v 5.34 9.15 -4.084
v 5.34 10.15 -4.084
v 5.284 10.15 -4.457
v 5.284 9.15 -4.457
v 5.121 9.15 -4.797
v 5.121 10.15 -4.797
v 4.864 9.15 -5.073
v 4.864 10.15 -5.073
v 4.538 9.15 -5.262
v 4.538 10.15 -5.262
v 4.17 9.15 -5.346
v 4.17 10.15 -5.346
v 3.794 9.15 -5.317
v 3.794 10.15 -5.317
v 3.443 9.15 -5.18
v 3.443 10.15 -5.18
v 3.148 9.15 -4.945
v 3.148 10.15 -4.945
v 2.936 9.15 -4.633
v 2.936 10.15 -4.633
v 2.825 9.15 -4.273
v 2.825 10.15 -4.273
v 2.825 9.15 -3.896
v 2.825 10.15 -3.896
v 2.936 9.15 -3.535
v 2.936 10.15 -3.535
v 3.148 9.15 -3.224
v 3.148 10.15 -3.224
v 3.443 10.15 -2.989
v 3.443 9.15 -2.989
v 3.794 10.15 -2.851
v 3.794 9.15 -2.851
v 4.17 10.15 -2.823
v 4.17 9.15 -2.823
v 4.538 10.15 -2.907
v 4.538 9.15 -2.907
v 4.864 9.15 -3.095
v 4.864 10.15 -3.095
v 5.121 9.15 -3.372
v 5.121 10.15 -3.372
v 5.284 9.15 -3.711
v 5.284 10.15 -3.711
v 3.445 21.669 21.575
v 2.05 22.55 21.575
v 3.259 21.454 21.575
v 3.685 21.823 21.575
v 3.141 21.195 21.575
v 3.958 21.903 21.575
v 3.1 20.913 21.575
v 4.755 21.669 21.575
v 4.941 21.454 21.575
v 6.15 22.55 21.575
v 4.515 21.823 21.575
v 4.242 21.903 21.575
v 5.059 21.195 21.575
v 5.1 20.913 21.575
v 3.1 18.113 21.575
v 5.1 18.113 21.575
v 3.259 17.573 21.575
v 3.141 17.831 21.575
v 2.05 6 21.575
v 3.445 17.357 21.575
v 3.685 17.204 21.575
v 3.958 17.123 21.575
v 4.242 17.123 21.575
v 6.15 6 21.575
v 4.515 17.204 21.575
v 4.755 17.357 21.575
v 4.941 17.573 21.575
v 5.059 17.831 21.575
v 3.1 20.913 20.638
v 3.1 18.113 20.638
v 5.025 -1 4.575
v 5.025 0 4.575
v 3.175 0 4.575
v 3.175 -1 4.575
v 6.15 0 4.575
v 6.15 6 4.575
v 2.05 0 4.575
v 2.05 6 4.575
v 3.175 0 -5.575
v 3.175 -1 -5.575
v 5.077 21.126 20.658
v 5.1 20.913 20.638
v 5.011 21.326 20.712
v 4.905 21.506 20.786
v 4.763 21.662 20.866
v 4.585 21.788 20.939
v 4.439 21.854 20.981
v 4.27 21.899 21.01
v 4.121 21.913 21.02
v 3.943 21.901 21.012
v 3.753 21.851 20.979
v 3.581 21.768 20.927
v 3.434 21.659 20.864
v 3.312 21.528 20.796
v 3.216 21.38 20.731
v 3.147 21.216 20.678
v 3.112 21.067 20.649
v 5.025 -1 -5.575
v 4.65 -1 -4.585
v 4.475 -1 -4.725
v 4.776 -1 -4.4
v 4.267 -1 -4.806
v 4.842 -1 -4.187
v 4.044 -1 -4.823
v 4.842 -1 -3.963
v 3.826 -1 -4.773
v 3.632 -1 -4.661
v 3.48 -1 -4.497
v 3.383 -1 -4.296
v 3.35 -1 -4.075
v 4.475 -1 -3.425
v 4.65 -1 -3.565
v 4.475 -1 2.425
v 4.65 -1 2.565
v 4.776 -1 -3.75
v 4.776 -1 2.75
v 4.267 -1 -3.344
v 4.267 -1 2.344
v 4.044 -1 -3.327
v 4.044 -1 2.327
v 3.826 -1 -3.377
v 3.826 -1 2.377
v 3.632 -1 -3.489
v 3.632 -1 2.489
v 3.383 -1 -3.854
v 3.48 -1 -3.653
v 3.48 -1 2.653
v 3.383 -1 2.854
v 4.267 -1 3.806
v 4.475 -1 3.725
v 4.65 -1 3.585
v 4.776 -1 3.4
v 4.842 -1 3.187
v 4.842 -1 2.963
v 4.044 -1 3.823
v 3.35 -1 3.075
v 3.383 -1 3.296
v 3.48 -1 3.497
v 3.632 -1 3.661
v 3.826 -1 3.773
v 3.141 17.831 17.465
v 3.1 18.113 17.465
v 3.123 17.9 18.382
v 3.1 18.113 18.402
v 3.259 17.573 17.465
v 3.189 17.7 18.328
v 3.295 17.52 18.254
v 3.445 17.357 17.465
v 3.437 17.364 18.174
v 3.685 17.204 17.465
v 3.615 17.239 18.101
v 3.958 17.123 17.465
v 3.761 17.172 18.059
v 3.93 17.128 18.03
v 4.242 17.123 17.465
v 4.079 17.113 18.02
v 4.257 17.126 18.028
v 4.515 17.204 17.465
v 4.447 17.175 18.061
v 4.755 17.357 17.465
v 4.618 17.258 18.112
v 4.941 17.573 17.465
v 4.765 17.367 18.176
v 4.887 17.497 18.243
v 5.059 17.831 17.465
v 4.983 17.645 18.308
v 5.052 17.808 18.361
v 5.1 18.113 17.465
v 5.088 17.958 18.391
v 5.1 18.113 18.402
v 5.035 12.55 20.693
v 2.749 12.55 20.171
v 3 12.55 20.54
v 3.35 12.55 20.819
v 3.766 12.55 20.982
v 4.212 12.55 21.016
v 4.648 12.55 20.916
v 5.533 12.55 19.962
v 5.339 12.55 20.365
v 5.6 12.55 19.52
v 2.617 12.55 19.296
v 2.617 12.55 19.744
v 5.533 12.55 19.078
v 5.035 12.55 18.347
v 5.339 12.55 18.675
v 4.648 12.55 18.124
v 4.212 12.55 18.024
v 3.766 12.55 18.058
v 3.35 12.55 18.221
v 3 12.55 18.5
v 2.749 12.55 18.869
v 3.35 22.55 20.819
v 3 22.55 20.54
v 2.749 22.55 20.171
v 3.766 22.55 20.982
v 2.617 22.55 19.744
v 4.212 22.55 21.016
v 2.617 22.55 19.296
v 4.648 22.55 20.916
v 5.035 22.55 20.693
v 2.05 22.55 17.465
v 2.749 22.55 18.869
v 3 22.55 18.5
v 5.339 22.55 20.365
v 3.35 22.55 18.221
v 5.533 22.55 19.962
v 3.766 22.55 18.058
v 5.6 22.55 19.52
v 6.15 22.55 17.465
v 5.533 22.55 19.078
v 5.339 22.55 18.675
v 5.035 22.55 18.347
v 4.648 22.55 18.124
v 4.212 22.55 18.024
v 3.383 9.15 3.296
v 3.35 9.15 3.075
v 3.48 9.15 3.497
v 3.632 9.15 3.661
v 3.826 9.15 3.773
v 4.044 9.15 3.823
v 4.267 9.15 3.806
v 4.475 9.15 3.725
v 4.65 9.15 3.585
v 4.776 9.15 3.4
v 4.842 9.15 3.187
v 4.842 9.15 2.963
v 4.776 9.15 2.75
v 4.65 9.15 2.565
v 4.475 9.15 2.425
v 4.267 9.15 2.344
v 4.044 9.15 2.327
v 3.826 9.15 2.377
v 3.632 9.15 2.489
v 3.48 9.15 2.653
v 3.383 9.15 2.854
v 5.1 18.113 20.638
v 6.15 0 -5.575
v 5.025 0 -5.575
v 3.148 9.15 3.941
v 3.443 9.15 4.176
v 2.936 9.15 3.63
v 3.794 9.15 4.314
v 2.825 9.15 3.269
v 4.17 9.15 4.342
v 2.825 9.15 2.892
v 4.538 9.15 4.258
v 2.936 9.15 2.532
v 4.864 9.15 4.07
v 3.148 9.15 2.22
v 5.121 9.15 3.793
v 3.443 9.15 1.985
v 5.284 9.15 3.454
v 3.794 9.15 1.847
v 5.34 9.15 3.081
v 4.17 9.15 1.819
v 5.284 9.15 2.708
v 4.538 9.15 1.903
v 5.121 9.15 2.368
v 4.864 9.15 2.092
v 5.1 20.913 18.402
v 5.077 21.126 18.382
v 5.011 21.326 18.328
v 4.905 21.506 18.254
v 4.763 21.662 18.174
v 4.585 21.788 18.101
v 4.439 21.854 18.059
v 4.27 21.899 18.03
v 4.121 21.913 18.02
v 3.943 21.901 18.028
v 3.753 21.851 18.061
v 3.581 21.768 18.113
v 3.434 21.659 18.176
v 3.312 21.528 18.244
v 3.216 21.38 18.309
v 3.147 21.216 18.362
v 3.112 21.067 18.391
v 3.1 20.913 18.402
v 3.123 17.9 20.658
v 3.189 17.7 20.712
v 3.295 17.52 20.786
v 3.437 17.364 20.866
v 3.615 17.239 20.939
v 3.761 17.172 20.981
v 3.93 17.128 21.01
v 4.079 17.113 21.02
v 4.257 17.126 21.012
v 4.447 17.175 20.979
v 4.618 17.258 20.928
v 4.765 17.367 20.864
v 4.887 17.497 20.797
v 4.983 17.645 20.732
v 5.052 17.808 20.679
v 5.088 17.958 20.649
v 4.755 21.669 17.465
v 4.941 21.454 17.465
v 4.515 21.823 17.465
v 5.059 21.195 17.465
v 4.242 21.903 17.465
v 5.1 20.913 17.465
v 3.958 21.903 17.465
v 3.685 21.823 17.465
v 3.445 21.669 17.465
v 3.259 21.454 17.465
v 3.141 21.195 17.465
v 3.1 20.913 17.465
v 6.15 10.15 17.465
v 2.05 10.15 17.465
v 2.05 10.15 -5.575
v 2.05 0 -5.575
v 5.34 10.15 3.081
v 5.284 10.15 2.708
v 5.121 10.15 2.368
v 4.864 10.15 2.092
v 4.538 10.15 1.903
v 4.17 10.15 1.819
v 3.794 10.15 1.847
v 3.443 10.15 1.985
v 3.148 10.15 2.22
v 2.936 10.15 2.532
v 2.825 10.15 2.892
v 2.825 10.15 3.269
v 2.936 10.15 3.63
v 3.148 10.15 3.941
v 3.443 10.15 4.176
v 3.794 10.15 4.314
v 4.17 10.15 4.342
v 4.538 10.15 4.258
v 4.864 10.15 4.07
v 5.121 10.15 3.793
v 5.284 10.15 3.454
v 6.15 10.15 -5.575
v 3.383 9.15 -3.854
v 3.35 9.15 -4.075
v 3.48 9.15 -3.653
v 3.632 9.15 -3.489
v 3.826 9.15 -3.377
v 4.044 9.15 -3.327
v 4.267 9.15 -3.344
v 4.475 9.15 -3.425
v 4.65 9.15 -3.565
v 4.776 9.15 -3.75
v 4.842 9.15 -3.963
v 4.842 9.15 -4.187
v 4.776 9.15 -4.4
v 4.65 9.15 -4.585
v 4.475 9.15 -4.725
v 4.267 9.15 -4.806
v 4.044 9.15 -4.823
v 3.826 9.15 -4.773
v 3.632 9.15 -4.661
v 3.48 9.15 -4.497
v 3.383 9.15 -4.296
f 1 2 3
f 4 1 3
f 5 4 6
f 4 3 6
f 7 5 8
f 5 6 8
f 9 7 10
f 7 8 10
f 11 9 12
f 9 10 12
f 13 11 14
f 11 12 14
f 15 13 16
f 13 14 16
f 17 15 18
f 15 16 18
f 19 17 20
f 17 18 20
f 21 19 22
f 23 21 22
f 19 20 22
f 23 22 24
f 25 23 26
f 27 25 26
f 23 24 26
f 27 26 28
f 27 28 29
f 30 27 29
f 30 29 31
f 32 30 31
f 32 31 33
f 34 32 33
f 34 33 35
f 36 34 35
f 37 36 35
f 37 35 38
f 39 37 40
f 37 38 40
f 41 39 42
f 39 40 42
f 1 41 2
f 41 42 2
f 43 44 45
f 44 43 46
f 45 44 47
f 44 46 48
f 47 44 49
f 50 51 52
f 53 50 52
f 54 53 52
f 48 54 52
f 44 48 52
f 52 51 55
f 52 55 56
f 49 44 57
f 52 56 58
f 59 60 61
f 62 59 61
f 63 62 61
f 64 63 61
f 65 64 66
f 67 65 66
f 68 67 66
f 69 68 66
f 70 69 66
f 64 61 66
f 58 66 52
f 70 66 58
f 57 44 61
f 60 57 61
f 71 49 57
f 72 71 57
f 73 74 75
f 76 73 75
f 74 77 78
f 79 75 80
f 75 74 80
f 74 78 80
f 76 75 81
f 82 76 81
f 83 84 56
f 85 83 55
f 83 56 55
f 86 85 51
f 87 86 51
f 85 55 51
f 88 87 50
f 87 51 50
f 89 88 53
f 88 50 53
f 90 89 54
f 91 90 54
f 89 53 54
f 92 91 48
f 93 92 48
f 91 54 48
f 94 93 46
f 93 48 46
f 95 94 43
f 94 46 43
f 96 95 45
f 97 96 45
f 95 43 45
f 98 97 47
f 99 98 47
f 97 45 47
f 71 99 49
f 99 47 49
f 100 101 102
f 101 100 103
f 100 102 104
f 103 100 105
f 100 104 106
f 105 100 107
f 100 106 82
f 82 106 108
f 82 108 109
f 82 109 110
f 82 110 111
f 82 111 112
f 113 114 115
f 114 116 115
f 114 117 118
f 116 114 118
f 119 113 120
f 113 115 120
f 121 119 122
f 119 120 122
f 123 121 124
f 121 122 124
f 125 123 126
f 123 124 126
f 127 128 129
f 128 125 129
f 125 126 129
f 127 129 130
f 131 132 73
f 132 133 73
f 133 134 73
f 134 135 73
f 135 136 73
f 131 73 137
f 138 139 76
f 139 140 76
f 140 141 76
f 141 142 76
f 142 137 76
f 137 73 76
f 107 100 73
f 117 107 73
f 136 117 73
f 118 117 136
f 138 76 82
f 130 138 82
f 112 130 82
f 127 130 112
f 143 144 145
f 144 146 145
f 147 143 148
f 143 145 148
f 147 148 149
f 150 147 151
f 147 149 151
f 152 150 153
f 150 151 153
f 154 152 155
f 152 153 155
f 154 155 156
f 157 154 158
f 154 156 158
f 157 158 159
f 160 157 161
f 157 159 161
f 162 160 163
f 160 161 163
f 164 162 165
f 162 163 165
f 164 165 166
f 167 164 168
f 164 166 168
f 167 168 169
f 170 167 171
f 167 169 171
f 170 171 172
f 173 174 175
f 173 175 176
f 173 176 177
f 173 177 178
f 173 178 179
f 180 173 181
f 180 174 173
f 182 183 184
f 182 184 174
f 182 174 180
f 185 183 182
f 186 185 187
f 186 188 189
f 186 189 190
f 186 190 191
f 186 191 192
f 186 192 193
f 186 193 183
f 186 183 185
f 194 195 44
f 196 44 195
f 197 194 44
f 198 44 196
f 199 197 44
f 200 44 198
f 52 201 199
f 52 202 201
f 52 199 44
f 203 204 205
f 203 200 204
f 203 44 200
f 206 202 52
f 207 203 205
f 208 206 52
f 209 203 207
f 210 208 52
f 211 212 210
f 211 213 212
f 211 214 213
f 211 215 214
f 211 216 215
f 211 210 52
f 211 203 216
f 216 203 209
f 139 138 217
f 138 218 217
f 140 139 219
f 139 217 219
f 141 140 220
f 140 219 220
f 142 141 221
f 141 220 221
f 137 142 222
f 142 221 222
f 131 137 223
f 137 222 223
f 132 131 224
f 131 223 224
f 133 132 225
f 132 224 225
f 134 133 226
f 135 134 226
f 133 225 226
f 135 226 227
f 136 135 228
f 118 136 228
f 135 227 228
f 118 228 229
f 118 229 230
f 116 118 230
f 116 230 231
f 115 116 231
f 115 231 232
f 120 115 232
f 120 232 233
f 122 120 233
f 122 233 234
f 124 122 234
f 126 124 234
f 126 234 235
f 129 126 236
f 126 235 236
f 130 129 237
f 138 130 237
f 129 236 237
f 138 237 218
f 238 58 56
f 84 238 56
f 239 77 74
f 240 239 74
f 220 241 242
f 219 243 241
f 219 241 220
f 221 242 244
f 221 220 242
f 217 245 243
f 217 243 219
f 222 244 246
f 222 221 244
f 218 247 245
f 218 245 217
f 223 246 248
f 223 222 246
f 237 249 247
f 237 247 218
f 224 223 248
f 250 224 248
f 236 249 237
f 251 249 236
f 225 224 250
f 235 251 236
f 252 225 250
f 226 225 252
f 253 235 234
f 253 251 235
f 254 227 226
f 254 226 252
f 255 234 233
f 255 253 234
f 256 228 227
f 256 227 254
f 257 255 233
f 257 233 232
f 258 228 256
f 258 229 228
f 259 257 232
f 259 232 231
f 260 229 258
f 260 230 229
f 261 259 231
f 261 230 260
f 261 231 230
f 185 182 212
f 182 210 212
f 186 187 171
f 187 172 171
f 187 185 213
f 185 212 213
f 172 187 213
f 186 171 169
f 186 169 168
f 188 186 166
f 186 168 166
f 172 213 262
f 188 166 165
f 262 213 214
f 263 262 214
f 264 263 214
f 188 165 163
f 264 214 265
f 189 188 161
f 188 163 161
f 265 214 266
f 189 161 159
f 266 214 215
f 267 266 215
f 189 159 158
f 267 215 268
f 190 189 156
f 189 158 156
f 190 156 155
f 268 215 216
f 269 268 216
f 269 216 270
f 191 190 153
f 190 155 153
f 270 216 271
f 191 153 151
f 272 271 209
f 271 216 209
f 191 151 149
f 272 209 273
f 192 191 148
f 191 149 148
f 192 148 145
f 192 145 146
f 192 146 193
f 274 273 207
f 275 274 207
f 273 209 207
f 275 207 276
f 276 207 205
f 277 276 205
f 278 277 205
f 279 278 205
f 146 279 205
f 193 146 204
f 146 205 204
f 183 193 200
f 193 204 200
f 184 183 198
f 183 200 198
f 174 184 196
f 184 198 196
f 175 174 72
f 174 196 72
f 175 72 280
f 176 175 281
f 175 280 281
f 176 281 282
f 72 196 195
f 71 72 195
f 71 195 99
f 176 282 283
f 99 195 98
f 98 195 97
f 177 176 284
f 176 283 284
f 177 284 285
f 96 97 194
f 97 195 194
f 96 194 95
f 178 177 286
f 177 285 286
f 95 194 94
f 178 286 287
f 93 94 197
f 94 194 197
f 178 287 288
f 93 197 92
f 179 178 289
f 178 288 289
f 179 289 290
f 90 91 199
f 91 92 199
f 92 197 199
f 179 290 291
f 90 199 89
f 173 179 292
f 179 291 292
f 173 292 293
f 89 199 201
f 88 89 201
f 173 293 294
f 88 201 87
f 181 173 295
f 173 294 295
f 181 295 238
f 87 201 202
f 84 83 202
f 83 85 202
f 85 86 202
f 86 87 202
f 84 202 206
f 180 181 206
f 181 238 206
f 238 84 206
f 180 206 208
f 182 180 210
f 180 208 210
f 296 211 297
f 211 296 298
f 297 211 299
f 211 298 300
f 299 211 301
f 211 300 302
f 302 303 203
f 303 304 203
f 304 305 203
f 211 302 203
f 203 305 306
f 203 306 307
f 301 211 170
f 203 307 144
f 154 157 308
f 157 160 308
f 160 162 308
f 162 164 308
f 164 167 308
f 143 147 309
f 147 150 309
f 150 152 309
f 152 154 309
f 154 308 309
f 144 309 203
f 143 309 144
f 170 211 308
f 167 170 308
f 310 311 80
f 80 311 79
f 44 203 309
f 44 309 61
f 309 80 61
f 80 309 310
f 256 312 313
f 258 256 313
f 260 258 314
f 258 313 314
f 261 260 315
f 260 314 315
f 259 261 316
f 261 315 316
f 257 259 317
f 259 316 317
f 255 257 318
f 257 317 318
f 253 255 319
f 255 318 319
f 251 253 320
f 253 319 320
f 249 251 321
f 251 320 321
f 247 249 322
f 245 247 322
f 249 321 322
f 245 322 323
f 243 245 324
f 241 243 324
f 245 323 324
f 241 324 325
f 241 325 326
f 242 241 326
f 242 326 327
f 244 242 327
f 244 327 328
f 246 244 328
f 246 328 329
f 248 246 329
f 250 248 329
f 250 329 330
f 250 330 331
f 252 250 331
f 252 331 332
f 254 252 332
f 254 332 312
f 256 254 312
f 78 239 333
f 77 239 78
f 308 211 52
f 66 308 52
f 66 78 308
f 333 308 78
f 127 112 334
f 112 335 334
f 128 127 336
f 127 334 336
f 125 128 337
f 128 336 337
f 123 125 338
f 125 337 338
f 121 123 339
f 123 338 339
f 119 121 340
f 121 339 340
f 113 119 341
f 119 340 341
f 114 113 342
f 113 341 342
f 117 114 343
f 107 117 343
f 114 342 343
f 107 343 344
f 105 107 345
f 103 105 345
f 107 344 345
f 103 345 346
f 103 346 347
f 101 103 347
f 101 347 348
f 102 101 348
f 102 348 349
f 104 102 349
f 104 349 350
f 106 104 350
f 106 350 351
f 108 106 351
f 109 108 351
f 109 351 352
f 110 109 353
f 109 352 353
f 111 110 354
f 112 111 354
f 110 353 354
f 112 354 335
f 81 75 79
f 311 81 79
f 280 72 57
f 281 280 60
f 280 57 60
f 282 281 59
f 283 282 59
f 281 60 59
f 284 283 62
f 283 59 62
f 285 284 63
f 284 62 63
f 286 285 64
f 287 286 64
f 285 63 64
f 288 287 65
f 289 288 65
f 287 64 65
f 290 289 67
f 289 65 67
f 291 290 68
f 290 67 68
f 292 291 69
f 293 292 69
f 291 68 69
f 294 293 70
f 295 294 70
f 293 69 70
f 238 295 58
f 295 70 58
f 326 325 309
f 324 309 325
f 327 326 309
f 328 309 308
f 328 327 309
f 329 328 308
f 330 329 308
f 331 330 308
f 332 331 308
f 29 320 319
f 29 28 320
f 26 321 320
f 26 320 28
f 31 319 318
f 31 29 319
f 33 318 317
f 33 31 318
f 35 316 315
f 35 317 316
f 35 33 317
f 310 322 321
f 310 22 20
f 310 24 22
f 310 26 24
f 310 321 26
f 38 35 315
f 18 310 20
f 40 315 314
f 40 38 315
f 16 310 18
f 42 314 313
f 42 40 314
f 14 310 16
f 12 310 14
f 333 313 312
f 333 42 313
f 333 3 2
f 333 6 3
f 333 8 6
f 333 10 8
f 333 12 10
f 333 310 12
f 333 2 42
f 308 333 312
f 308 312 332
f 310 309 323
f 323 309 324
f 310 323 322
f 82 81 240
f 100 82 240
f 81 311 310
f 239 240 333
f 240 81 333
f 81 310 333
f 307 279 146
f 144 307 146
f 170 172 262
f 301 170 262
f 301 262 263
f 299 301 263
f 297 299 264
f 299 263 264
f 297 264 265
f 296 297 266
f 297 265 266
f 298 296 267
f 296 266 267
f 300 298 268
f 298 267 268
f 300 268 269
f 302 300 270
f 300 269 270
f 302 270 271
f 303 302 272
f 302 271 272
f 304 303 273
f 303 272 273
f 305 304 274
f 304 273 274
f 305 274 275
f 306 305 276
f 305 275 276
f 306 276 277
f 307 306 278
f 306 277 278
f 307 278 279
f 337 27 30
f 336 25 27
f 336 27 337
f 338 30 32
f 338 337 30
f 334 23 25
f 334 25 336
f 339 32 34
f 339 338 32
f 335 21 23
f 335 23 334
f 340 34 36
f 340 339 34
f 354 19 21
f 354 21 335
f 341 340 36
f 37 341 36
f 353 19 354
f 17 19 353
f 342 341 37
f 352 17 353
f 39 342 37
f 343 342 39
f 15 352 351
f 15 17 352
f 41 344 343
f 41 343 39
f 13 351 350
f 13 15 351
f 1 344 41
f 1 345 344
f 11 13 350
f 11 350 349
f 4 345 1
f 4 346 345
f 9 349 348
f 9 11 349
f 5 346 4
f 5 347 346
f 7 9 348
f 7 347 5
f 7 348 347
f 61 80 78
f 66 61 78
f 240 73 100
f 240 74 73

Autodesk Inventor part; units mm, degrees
ref_plane "YZ Plane" through (0, 0, 0) normal (1, 0, 0) x (0, 1, 0)
ref_plane "XZ Plane" through (0, 0, 0) normal (0, 1, 0) x (-1, 0, 0)
ref_plane "XY Plane" through (0, 0, 0) normal (0, 0, 1) x (1, 0, 0)
sketch "Sketch1" plane through (0, 0, 0) normal (0, 1, 0) x (-1, 0, 0)
  line L0 (-2.05, -5.575) -> (-6.15, -5.575)
  line L1 (-6.15, -5.575) -> (-6.15, 4.575)
  line L2 (-6.15, 4.575) -> (-2.05, 4.575)
  line L3 (-2.05, 4.575) -> (-2.05, -5.575)
  line L4 (-3.175, 4.575) -> (-5.025, 4.575)
  line L5 (-3.175, 4.575) -> (-3.175, -5.575)
  line L6 (-5.025, 4.575) -> (-5.025, -5.575)
  circle A0 centre (-4.1, 3.075) radius 0.75
  circle A1 centre (-4.1, -4.075) radius 0.75
  point P0 (-4.1, 4.575)
  point P1 (-4.1, -5.575)
  point P2 (-1.1679, -0.0702)
  point P3 (-4.1, 4.575)
  dimension "d13" = 4.1
  dimension "d14" = 10.15
  dimension "d44" = 1.85
  dimension "d45" = 1.125
  dimension "d46" = 1.5
  dimension "d47" = 1.5
  dimension "d48" = 1.5
  dimension "d49" = 1.5
extrude "Extrusion1" add sketch "Sketch1" along normal blind 10.15
sketch "Sketch11" plane through (2.05, 0, 4.575) normal (0, 0, 1) x (1, 0, 0)
  point P0 (-2.05, 0)
extrude "Extrusion6" add sketch "Sketch1" against normal blind 1 contours L0 L6 L2 L5
sketch "Sketch12" plane through (0, 10.15, 0) normal (0, 1, 0) x (1, 0, 0)
  circle A0 centre (4.0754, 4.0842) radius 1.265
  circle A1 centre (4.0754, -3.0807) radius 1.265
  point P0 (0, 0)
  dimension "d52" = 2.53
  dimension "d53" = 2.53
extrude "Extrusion7" cut sketch "Sketch12" against normal blind 1
sketch "Sketch13" plane through (2.05, 10.15, 4.575) normal (0, 0, 1) x (1, 0, 0)
  line L0 (0, 0) -> (0, -4.15)
  line L1 (0, -10.15) -> (0, 0) projected
  line L2 (0, -4.15) -> (4.1, -4.15)
  line L3 (4.1, -10.15) -> (4.1, 0) projected
  line L4 (4.1, 0) -> (4.1, -4.15)
  line L5 (0, 0) -> (4.1, 0)
  point P0 (-2.05, -10.15)
  dimension "d56" = 4.15
extrude "Extrusion8" add sketch "Sketch13" along normal blind 17
sketch "Sketch14" plane through (0, 10.15, 0) normal (0, 1, 0) x (1, 0, 0)
  line L0 (6.15, 5.575) -> (6.15, -21.575) projected
  line L1 (6.15, -21.575) -> (6.15, -17.465)
  line L2 (6.15, -17.465) -> (2.05, -17.465)
  line L3 (2.05, 5.575) -> (2.05, -21.575) projected
  line L4 (2.05, -21.575) -> (6.15, -21.575)
  point P0 (0, 0)
  dimension "d59" = 4.11
extrude "Extrusion9" add sketch "Sketch14" along normal blind 12.4
sketch "Sketch15" plane through (2.05, 10.15, 21.575) normal (0, 0, 1) x (1, 0, 0)
  line L0 (2.05, 10.7632) -> (2.05, 7.9632) construction
  line L1 (4.1, 0) -> (4.1, 12.4) projected
  line L2 (1.05, 10.7632) -> (1.05, 7.9632)
  line L3 (3.05, 7.9632) -> (3.05, 10.7632)
  arc A0 (3.05, 10.7632) -> (1.05, 10.7632) centre (2.05, 10.7632) ccw
  arc A1 (1.05, 7.9632) -> (3.05, 7.9632) centre (2.05, 7.9632) ccw
  point P0 (-2.05, -10.15)
  point P1 (2.05, 9.3632)
  dimension "d62" = 1.4
  dimension "d63" = 2
  dimension "d64" = 2.05
extrude "Extrusion10" cut sketch "Sketch15" against normal through all
sketch "Sketch16" plane through (0, 22.55, 0) normal (0, 1, 0) x (1, 0, 0)
  circle A0 centre (4.1, -19.52) radius 1.5
  line L0 (2.05, -21.575) -> (6.15, -21.575) projected
  line L1 (6.15, -21.575) -> (6.15, -17.465) projected
  point P0 (0, 0)
  point P1 (4.1, -21.575)
  dimension "d67" = 3
  dimension "d68" = 2.055
  dimension "d69" = 2.05
extrude "Extrusion11" cut sketch "Sketch16" against normal blind 10
equation "\"d13\" = base_width"
equation "\"d14\" = base_length"
equation "\"d45\" = -0.5 * d44 + 0.5 * d13"
equation "\"d4\" = base_length"
equation "\"base_width\" = 4.1"
equation "\"base_length\" = 10.15"
equation "\"base_screw_diameter\" = 1.5"
equation "\"base_screw_spacing_edge\" = 8.5"
properties part number "original_holder"
